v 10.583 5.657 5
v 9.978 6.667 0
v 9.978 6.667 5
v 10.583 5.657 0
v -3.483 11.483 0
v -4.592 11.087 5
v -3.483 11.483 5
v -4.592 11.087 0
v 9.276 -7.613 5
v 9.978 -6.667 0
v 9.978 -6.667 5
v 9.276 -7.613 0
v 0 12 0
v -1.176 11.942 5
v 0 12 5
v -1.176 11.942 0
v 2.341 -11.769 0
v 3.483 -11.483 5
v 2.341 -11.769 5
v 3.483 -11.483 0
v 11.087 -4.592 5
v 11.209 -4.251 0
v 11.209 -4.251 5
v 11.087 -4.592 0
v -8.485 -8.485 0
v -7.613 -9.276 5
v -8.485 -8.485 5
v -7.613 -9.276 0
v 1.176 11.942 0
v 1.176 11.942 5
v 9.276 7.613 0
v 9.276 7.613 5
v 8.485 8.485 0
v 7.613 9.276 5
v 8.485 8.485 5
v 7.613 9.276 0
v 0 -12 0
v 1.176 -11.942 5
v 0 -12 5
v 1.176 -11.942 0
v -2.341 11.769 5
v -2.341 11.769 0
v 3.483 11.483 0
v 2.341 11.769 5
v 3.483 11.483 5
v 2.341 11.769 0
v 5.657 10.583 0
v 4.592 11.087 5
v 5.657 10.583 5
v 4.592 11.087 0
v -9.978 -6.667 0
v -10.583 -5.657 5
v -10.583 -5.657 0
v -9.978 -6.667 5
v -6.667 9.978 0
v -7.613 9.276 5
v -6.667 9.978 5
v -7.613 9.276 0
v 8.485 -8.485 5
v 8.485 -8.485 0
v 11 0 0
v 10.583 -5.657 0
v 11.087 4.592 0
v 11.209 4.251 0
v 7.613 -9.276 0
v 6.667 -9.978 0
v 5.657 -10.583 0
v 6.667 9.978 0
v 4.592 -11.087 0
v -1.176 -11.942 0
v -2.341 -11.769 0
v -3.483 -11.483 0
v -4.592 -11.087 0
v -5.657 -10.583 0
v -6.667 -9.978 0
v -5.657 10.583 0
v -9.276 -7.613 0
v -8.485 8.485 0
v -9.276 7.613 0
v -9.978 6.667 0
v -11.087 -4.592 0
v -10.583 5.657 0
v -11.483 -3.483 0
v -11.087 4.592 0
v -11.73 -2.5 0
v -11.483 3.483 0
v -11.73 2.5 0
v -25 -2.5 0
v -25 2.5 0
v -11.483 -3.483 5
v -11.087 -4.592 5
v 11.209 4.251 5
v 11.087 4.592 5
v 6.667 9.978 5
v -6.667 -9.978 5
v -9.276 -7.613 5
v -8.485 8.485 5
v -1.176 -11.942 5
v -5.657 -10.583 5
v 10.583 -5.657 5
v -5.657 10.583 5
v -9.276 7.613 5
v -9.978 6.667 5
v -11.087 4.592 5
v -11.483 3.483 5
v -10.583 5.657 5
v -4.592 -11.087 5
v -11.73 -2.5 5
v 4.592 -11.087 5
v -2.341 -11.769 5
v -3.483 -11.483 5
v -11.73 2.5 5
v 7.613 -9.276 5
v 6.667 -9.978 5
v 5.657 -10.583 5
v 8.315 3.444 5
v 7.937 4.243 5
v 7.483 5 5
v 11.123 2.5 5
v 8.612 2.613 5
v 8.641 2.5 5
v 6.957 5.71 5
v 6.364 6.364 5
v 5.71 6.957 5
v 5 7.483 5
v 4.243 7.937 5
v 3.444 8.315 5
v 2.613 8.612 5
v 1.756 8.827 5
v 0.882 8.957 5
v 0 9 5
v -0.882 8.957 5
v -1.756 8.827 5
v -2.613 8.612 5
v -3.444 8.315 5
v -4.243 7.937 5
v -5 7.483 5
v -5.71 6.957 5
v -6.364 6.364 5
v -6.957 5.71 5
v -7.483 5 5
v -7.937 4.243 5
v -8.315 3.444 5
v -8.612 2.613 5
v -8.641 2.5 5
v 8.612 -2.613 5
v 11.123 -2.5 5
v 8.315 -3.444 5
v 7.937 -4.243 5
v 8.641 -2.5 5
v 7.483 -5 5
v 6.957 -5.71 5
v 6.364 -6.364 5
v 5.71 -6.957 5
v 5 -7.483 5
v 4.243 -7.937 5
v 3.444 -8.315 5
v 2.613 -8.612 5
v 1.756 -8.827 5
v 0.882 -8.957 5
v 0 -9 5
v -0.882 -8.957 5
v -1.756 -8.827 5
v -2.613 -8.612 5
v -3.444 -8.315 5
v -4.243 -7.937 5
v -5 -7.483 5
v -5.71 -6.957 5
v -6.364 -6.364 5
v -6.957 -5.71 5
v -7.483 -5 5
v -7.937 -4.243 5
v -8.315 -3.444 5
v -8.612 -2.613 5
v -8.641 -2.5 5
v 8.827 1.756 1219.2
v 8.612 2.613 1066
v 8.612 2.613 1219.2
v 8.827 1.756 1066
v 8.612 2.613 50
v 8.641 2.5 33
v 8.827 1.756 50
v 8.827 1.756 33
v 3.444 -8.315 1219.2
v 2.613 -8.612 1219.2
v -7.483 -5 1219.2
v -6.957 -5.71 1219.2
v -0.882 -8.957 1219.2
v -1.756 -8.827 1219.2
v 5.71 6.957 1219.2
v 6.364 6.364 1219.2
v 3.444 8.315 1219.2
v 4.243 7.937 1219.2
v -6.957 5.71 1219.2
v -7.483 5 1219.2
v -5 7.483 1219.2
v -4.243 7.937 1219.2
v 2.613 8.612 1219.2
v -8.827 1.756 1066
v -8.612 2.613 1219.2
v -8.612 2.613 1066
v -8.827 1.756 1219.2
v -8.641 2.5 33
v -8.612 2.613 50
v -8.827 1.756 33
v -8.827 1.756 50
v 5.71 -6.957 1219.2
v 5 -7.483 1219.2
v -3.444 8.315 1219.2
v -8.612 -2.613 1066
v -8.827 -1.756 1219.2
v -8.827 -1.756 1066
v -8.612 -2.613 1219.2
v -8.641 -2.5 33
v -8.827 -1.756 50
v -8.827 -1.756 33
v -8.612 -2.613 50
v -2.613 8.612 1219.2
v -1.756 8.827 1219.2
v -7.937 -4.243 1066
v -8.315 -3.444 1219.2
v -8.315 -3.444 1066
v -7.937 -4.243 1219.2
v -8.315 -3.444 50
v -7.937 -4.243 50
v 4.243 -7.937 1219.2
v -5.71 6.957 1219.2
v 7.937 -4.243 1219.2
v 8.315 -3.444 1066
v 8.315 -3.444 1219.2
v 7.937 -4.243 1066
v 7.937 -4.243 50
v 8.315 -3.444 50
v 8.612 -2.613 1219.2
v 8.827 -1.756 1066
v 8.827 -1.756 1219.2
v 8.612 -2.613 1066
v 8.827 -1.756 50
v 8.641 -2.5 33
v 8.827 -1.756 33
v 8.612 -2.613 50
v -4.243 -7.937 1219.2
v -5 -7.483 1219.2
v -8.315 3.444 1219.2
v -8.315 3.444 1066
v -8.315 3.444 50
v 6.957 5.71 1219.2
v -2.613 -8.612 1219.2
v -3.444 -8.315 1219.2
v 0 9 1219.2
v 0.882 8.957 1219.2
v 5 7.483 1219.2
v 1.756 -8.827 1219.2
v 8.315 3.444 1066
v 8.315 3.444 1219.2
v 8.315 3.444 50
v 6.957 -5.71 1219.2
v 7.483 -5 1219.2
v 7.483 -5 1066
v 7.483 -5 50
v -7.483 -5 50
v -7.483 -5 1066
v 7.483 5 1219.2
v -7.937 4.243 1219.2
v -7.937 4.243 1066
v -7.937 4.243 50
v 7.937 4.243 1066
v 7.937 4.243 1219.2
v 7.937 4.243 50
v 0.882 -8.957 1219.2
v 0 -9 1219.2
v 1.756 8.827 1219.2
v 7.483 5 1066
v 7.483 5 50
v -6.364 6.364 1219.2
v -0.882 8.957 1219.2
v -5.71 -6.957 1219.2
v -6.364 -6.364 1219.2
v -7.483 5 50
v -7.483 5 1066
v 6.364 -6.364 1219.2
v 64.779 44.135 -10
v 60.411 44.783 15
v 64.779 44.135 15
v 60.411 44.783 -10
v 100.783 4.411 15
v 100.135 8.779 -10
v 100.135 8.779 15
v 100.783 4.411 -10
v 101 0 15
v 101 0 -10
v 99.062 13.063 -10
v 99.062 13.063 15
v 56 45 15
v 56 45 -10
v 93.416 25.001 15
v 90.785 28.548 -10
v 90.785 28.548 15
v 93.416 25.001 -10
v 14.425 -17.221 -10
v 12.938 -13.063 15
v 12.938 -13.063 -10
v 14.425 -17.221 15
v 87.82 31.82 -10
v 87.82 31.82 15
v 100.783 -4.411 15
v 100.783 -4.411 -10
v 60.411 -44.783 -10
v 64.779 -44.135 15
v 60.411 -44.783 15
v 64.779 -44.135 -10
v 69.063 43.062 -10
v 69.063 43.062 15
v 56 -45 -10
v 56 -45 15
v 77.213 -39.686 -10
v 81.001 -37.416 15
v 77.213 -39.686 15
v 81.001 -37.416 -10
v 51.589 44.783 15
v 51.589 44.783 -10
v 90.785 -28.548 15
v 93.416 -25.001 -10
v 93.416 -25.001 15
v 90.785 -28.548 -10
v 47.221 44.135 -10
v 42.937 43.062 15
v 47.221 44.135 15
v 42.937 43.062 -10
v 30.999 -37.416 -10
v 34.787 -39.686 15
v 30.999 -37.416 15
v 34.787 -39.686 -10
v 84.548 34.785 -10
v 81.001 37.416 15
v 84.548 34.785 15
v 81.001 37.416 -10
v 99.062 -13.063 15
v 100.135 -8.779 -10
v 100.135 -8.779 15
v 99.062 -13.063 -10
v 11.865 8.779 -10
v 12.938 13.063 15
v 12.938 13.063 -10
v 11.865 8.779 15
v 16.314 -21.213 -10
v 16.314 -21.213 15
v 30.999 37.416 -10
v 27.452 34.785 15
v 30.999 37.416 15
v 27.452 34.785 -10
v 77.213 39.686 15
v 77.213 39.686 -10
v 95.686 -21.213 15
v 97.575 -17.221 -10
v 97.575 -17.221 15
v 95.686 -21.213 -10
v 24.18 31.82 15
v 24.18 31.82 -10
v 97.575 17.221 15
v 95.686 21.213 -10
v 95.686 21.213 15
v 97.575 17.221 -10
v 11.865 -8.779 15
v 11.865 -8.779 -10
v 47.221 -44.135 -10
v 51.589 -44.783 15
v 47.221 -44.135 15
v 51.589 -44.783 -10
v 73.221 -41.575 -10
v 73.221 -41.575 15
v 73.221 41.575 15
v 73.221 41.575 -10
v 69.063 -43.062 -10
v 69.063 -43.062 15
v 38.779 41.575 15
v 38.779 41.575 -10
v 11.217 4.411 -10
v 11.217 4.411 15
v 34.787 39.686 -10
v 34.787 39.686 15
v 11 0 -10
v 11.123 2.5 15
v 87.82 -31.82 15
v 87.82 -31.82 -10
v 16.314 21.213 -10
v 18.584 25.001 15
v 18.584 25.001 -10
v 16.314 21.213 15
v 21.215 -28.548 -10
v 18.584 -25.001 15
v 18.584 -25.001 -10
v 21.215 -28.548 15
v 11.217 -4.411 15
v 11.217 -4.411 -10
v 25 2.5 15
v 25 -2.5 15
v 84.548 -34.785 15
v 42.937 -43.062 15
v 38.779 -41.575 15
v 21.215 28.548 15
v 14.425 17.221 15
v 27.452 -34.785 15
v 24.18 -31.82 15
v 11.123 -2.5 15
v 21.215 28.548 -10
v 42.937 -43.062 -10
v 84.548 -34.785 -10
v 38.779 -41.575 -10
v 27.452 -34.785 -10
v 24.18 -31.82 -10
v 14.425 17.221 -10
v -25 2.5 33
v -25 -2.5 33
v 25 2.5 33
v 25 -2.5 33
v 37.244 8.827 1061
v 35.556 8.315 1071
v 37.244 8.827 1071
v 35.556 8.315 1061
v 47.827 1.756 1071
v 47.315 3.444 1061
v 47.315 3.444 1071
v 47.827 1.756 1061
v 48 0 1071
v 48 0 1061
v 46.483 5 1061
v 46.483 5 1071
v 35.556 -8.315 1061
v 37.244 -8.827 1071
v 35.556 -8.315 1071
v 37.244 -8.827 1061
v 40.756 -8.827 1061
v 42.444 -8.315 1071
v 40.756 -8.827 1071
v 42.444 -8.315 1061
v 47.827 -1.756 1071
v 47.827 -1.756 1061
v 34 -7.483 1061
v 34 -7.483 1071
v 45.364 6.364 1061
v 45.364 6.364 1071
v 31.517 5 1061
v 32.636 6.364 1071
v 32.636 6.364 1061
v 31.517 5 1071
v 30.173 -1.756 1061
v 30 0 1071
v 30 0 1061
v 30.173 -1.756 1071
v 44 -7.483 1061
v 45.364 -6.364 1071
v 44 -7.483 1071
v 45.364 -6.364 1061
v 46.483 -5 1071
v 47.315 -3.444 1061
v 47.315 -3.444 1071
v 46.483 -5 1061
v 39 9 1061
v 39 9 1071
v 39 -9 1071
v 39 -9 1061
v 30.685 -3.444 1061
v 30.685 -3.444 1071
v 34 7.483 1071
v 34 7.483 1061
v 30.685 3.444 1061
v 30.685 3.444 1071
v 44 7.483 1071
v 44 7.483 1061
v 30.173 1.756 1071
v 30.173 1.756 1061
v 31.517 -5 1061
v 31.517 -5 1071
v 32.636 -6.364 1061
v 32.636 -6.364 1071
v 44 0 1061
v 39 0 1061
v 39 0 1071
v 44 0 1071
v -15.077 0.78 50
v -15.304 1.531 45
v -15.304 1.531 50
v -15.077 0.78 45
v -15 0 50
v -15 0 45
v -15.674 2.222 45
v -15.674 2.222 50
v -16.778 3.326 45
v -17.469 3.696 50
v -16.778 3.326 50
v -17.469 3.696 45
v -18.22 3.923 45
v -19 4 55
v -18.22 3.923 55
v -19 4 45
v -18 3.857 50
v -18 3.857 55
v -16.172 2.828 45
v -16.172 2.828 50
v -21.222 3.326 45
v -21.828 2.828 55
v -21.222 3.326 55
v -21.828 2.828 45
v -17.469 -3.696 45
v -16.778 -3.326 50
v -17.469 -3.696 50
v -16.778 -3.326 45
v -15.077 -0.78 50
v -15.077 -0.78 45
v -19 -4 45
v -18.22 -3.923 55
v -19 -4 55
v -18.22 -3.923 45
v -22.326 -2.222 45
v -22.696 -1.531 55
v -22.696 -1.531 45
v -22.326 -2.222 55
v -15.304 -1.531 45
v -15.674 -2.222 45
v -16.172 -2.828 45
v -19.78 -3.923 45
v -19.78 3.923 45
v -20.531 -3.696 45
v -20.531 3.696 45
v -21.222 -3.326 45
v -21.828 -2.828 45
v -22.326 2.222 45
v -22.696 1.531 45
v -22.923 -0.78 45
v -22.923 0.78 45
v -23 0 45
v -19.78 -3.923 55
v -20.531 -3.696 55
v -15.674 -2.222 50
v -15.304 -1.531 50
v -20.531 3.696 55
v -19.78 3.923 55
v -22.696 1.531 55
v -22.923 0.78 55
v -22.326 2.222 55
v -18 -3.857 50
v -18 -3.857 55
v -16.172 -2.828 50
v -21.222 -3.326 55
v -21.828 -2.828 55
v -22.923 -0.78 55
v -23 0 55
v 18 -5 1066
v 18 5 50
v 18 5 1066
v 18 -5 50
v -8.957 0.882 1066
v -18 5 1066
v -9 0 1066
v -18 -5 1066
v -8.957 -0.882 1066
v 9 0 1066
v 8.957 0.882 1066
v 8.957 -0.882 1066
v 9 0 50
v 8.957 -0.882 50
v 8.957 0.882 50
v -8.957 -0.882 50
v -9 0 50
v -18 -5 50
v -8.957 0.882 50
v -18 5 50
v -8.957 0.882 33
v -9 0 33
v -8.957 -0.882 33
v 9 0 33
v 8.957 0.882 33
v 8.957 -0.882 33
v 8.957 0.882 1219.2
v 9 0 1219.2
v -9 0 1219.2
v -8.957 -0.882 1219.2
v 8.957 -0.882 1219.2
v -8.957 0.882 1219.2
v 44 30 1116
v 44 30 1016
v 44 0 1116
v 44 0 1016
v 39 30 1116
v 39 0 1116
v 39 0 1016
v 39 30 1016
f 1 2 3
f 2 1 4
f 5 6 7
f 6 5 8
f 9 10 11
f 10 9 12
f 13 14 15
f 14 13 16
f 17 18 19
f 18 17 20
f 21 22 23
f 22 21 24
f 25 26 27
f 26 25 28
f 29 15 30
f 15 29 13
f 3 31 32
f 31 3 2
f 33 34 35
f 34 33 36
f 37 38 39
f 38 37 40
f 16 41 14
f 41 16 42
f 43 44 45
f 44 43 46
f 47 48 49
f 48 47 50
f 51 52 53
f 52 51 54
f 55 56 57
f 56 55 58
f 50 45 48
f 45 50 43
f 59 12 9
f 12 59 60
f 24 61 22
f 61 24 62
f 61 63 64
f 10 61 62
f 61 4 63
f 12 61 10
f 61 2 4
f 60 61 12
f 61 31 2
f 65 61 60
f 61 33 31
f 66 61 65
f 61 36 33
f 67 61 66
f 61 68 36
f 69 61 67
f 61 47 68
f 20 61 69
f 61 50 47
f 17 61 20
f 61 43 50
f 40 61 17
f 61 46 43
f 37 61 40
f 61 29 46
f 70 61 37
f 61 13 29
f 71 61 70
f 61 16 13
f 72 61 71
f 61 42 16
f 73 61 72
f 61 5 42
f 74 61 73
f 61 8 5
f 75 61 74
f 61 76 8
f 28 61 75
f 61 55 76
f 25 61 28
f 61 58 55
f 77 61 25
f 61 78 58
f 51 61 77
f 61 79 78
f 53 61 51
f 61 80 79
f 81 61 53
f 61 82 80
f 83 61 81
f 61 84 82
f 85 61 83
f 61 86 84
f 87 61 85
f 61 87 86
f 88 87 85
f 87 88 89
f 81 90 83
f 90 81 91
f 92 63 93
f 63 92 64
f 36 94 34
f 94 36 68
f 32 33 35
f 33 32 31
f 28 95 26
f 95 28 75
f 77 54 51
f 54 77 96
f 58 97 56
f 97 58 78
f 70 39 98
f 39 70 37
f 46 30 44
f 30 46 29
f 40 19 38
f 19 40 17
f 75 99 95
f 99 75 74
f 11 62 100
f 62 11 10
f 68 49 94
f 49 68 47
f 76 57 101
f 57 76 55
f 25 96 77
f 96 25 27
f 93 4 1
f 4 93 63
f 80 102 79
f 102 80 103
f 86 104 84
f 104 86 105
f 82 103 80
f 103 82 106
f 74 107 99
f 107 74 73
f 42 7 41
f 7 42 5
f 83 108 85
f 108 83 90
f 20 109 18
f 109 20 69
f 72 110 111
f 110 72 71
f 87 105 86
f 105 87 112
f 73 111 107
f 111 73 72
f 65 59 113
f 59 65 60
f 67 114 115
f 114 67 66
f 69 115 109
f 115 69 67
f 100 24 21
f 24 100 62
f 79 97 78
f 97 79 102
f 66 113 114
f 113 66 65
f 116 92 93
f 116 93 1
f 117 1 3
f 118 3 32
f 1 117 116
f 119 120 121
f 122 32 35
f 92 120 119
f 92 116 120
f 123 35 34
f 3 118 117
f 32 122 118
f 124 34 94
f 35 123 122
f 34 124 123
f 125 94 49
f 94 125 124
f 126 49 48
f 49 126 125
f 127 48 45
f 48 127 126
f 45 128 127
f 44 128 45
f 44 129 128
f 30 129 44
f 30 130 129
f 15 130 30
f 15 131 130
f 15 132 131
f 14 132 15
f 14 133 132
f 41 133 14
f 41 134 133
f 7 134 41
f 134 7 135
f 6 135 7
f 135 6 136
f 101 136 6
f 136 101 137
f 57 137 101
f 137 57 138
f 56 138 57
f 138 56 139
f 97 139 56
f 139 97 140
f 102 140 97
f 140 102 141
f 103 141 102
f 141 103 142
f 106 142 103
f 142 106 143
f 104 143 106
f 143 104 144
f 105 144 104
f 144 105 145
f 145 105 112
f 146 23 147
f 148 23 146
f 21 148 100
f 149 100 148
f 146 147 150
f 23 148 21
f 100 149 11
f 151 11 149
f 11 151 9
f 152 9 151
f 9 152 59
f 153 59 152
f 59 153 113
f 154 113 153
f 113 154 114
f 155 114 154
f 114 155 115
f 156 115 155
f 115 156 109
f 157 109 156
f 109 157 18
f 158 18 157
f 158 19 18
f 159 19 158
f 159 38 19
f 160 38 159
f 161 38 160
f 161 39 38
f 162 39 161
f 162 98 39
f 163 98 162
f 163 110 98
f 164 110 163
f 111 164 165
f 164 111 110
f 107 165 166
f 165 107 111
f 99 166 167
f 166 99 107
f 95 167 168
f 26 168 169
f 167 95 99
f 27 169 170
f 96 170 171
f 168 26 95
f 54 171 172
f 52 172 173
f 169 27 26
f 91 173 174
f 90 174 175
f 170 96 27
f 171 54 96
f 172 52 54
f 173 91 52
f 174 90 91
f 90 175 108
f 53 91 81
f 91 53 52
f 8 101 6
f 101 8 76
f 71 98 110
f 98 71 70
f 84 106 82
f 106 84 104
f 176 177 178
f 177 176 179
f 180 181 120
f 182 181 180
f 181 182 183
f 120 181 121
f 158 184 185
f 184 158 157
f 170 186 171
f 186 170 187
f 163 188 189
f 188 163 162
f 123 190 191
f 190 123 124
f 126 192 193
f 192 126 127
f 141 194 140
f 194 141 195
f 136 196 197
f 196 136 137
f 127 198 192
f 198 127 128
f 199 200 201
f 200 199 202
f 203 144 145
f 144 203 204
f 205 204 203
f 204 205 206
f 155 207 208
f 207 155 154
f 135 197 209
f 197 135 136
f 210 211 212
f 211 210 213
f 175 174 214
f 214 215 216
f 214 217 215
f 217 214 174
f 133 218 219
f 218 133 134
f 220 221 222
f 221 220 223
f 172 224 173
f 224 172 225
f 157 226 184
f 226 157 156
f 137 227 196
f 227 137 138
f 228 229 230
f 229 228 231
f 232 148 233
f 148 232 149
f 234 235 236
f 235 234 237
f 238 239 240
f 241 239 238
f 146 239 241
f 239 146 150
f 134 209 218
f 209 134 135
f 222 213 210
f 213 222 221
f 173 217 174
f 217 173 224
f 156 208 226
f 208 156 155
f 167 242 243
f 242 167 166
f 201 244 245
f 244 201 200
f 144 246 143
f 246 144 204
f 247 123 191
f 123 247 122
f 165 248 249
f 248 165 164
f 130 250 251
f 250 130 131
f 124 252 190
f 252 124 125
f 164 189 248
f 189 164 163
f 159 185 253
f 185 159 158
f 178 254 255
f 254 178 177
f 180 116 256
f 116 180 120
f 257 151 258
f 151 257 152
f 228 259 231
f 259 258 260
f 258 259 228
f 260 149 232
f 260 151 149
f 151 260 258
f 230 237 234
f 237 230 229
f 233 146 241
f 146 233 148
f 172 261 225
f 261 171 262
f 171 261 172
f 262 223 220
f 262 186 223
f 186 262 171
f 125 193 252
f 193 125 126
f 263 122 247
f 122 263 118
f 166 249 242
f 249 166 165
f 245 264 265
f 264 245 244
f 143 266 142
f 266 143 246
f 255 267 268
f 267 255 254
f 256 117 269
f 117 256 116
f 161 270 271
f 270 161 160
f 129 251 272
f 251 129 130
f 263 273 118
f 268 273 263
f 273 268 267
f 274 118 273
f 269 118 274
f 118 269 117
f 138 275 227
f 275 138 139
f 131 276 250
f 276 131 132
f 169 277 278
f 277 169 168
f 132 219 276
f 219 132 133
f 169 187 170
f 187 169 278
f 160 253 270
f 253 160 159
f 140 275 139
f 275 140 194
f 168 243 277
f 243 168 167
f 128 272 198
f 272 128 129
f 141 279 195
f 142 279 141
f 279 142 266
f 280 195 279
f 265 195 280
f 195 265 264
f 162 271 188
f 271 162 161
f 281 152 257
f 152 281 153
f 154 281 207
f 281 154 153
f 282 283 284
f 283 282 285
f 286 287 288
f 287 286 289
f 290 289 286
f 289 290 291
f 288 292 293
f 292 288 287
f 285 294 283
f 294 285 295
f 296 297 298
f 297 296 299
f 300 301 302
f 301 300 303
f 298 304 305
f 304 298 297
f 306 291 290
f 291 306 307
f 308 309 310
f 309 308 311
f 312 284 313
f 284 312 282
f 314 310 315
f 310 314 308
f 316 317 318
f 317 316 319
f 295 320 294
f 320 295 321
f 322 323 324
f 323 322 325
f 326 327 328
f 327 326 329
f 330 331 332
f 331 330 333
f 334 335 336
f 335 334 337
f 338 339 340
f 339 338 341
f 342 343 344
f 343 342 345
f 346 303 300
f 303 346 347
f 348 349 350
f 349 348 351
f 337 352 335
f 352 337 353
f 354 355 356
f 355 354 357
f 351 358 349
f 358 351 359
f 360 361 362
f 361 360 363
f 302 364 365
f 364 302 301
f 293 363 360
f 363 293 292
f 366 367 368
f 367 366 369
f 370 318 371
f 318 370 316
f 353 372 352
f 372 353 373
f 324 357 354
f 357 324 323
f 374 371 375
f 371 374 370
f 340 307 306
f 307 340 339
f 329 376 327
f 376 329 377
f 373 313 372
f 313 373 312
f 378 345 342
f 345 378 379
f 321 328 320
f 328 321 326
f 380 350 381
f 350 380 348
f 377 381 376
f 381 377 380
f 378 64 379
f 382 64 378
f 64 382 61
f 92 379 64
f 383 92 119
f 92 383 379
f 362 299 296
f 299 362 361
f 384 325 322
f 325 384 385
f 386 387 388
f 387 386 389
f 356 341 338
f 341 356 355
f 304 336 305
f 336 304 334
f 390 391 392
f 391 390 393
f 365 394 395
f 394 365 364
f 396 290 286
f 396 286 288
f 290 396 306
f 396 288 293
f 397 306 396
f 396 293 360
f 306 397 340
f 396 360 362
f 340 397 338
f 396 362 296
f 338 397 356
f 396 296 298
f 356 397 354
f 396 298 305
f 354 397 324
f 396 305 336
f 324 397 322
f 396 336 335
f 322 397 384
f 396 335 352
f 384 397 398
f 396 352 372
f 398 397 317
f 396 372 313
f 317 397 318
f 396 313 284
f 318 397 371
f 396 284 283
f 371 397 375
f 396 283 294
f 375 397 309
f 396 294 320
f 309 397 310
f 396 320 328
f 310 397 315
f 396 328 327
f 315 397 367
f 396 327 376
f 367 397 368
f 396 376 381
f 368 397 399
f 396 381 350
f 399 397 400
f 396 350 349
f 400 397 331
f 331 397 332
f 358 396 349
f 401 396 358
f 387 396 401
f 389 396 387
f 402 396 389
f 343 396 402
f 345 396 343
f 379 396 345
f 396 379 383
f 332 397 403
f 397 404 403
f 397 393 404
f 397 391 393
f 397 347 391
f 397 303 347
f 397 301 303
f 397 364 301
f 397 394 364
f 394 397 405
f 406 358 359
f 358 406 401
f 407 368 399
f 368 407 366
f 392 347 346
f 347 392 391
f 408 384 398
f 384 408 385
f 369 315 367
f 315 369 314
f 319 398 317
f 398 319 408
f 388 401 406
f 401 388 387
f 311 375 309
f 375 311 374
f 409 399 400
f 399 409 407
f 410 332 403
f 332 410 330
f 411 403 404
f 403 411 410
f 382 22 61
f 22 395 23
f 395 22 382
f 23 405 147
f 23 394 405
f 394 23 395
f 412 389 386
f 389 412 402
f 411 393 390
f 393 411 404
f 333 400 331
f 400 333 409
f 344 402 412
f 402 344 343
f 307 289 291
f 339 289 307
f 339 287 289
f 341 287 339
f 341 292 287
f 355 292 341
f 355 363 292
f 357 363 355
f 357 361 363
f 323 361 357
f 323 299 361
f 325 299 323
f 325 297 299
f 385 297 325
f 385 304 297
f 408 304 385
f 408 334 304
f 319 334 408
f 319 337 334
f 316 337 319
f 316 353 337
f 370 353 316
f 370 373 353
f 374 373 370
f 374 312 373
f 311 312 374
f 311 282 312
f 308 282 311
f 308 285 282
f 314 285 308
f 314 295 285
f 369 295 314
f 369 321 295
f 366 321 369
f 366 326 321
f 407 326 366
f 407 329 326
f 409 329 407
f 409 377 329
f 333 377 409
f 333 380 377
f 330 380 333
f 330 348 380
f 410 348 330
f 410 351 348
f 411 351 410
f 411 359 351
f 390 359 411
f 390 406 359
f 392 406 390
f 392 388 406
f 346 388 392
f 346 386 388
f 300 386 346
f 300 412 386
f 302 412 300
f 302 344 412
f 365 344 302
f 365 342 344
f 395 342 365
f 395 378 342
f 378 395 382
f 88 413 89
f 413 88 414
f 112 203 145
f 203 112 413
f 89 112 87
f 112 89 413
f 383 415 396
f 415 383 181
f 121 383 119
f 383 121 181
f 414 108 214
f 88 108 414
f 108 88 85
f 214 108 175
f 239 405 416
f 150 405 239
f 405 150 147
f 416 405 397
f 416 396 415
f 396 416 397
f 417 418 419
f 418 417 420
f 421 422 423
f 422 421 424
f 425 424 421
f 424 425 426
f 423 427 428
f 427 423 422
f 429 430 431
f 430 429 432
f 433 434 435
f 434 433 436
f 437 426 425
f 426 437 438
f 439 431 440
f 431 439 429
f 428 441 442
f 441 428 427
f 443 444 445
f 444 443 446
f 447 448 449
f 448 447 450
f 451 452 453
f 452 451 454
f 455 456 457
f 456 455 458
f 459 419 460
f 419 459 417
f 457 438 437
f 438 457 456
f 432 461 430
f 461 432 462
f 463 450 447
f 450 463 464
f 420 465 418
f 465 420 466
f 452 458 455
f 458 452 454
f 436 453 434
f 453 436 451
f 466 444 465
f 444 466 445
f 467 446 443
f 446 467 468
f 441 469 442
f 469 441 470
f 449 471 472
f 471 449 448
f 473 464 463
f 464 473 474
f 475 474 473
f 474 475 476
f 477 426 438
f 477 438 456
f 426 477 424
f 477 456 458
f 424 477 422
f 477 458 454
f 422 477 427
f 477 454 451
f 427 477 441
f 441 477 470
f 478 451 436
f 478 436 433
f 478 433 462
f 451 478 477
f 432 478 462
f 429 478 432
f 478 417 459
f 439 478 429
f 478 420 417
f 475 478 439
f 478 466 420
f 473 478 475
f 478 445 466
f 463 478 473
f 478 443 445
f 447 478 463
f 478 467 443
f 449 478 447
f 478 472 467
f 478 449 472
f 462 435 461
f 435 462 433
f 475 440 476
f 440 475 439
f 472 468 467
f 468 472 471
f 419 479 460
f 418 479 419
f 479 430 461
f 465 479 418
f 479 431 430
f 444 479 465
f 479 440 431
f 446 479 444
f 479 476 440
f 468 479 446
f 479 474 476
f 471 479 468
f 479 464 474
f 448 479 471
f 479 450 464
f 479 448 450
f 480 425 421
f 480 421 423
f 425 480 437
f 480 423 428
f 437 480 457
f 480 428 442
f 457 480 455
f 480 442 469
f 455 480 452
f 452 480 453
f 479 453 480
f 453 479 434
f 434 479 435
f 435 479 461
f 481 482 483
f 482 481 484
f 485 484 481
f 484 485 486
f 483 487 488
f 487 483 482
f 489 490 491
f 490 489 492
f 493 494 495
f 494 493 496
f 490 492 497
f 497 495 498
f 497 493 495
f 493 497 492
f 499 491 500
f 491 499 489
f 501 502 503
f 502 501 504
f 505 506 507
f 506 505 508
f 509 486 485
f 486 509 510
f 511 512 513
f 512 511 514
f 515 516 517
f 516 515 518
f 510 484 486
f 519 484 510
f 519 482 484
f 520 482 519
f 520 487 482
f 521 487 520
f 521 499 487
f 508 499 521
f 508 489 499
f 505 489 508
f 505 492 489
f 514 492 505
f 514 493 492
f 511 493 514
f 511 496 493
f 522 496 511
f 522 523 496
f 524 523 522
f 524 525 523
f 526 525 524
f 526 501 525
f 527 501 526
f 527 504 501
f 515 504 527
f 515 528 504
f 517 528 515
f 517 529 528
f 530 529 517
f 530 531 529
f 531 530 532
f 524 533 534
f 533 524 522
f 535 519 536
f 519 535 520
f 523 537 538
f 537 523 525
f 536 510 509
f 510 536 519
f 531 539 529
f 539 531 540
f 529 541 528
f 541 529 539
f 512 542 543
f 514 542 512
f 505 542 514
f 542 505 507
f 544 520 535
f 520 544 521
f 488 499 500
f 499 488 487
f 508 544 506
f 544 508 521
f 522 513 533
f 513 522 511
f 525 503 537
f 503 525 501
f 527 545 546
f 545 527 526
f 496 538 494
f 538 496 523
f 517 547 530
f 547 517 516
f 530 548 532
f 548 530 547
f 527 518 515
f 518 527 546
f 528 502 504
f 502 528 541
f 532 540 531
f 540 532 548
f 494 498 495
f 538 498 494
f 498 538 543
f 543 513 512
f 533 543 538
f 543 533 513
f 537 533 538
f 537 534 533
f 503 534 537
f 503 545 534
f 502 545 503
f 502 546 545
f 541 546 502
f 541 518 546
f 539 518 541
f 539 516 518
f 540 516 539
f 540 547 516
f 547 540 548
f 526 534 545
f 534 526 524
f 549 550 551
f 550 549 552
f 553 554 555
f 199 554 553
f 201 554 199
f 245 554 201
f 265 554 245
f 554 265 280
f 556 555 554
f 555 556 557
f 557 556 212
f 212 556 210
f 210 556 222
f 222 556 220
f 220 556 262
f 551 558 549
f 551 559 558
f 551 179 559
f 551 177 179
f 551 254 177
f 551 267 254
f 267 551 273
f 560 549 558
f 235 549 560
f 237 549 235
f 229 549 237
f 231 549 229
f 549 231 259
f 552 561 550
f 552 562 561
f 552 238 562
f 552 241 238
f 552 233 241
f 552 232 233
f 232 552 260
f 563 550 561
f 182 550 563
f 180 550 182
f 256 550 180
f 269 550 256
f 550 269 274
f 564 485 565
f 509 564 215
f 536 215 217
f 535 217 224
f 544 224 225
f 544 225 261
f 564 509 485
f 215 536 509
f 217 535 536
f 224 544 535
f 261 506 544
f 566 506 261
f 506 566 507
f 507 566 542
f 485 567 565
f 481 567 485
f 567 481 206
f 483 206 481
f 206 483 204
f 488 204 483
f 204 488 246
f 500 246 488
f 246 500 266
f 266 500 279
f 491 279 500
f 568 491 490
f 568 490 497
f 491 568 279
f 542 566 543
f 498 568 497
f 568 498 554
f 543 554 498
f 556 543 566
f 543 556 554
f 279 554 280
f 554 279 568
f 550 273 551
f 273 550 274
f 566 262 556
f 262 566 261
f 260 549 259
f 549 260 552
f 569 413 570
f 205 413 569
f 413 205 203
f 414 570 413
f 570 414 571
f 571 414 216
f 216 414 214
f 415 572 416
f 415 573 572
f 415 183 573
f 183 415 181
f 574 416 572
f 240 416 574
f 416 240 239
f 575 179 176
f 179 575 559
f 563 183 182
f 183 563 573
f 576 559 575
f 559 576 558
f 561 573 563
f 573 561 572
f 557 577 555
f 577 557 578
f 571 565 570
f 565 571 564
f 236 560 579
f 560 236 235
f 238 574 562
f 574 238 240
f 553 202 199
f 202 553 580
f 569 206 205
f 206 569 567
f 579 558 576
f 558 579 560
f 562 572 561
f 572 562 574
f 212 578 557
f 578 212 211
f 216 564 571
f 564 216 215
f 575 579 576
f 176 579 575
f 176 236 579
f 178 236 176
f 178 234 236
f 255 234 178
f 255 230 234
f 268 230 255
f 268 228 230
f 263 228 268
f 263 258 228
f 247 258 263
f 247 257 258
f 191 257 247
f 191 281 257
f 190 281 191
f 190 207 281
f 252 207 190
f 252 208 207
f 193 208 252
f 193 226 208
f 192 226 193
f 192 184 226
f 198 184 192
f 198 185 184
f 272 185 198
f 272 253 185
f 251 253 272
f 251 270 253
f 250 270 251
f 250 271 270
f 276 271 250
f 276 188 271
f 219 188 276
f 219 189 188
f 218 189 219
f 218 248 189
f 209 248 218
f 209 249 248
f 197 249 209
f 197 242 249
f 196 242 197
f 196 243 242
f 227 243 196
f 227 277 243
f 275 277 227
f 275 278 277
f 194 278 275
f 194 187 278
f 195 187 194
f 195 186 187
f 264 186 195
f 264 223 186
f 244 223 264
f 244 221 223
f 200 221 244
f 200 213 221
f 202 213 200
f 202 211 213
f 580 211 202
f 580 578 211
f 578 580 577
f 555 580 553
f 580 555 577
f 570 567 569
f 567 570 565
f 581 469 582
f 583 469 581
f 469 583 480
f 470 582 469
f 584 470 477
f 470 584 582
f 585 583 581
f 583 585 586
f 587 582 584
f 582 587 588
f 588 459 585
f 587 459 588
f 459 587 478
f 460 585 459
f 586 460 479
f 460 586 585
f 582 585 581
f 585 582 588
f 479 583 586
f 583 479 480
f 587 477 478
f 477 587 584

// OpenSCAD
//
// WeedGripperTool v0.1
// Single-file parametric OpenSCAD example for a weed-pulling tool.
// By [Your Name or Organization], [Date]
//
// NOTES:
//  - This script is a conceptual starting point with placeholder geometry.
//  - You should refine geometry for strength, print orientation, CNC details, etc.
//  - Modules are designed to be easily re-used or rearranged as you iterate.
//
// LICENSE: Whatever license you prefer (e.g., MIT, CC-BY, GPL, etc.)
//

//----------------------------------------
// Top-Level Parameters & Constants
//----------------------------------------

// Unit conversion for convenience
function inToMM(inches) = inches * 25.4; 

// 1/2" EMT approximate dimensions
emtOD = 18;          // Outer diameter in mm (nominal ~17.9mm)
emtID = 16;          // Inner diameter in mm (nominal ~15.8mm)

// Overall tool length (EMT conduit)
toolLength = inToMM(48);  // 48" ~ 1219mm

// Handle/Lever geometry
handleHeightFromBottom = inToMM(40);  // Lever/trigger ~40" from bottom
handleOffset = 30;                   // How far handle protrudes from pipe
handleThickness = 5;                 // For extrusions, placeholders

// Jaw/gripper geometry
jawMaxSpan = 50;     // ~2" in mm, max open span of jaws
jawDepth = 30;       // Some arbitrary depth for 3D printed jaws
jawThickness = 5;    // Basic thickness for each jaw half

// Wheel / pivot geometry
useWheels = true;
wheelDiameter = 90;   // e.g., a reused 3D filament spool or small wheel
wheelThickness = 25;  // approximate thickness for spool-type wheel
wheelMountThickness = 5;

// Belt/Pulley placeholders
beltWidth = 10;   // GT2 belt 10 mm wide
pulleyOD = 18;    // Example GT2 pulley OD, placeholders
idlerOD = 8;      // Example GT2 idler OD, placeholders

// Screw & hardware parameters
boltHoleDiameter = 5.5;    // For M5 bolts
nutTrapDepth = 6;          // Param for nylock or standard nut captures
plateThicknessAcrylic = 6; // e.g., 1/4" ~ 6.35mm for acrylic
plateThicknessPlywood = 12; // e.g., 1/2" ~ 12.7mm for plywood

// Pro version includes optional AI hardware mount
ProVersion = false;  // If true, adds Pi Camera, servo/stepper placeholders, etc.

// Debug / assembly
showExploded = false; 
explodeOffset = 50;  // How far to shift components for clarity

//----------------------------------------
// Modules
//----------------------------------------

//
// 1) EMT Conduit Placeholder
//
// This is just a visual placeholder for the tube you’ll supply
// Users will purchase their own 1/2" EMT conduit (48" long).
//
module showEMT() {
    color("silver") 
    cylinder(h=toolLength, r=emtOD/2, center=false, $fn=64);
}

//
// 2) EMT Mount (for wheel pivot, for handle, etc.)
// Param: height -> the position along the EMT to mount
//        thickness -> extrude thickness
//        name -> string for identification
//
module emtMount(height, thickness=5, name="emtMount") {
    // Basic ring clamp that attaches around the EMT
    translate([0,0,height])
    difference() {
        cylinder(h=thickness, r=emtOD/2+3, center=false, $fn=64); // Outer
        cylinder(h=thickness+0.1, r=emtOD/2, center=false, $fn=64); // Subtract ID
    }
}

//
// 3) Lever/Trigger Handle
// Very rough "rifle style" handle shape for demonstration
// You can refine the shape to be more comfortable and aesthetic.
//
module handle() {
    // A simplistic handle: a vertical rectangular extrusion offset from the pipe.
    translate([emtOD/2 + handleOffset,0,handleHeightFromBottom]) {
        color("red")
        cube([handleThickness, 30, 100], center=false);
    }
}

//
// 4) Gripper Jaws
// Two opposing jaws that pinch around a center axis. 
// We'll do a simplistic shape here. Each jaw is a box with a curved tip. 
// You can adapt more specialized geometry (fingerlike shape, etc.).
//
module gripperJaws() {
    // "Left" jaw
    translate([-jawMaxSpan/2,0,0]) {
        color("green")
        union() {
            // Main block
            cube([jawMaxSpan/2, jawThickness, jawDepth], center=false);
            // Curved tip for comedic "finger" shape
            translate([jawMaxSpan/2, jawThickness/2, jawDepth/2]) {
                cylinder(h=jawThickness, r=jawThickness, $fn=32, center=true);
            }
        }
    }
    // "Right" jaw
    translate([0,0,0]) {
        color("green")
        union() {
            cube([jawMaxSpan/2, jawThickness, jawDepth], center=false);
            translate([0, jawThickness/2, jawDepth/2]) {
                cylinder(h=jawThickness, r=jawThickness, $fn=32, center=true);
            }
        }
    }
}

//
// 5) TPU Finger Pads
// Example insert that fits over the jaws or has a friction fit
// In real design, you'd ensure geometry for tension, alignment, etc.
//
module tpuFingerPad() {
    color("yellow")
    // Just a small piece that can be glued or friction-fit on top of each jaw tip.
    // We'll define a single pad; you'd instance it in place for each jaw if needed.
    translate([0,0,jawDepth]) {
        cube([jawMaxSpan/2, jawThickness, 3], center=false);
    }
}

//
// 6) Pivot/Wheel Module
// This could be a 3D-printed or CNC cut bracket that mounts a wheel or spool
// near the bottom of the tool so it can roll/pivot, making it easier to lever weeds.
// 
module pivotWheelMount() {
    // We'll place the wheel near the bottom, with the bracket around the EMT
    // For demonstration, we create a ring clamp plus an axle for the wheel
    color("blue")
    union() {
        // The clamp around the EMT
        emtMount(0, wheelMountThickness, "wheelClamp");

        // Axle for wheel
        translate([emtOD/2 + wheelDiameter/2 + 2, 0, wheelMountThickness/2]) {
            cylinder(h=10, r=3, center=true, $fn=32);
        }
    }
}

//
// 7) Wheel/Omni-wheel or spool
// The actual rolling element. Could be an omni-wheel or spool from 3D filament.
//
module pivotWheel() {
    color("orange")
    translate([emtOD/2 + wheelDiameter/2 + 2, 0, wheelMountThickness/2]) {
        cylinder(h=wheelThickness, r=wheelDiameter/2, center=true, $fn=64);
    }
}

//
// 8) Belt/Pulley/Idler placeholders
// The actual path and tension mechanism is up to you—this is just a demonstration.
//
module beltSystem() {
    color("purple")
    // Show a pulley near handle
    translate([emtOD/2 + handleOffset, 0, handleHeightFromBottom + 50]) {
        cylinder(h=beltWidth, r=pulleyOD/2, center=true, $fn=32);
    }
    
    // Show an idler near jaws (you'd refine exact positioning)
    translate([-(emtOD/2 + 10), 0, 50]) {
        cylinder(h=beltWidth, r=idlerOD/2, center=true, $fn=32);
    }
    
    // Just a placeholder belt as a rectangular block
    // In real design, you'd extrude a path or show a more accurate belt shape.
    translate([-emtOD, -beltWidth/2, 50]) 
    cube([emtOD*2, beltWidth, handleHeightFromBottom], center=false);
}

//
// 9) ProVersion Electronics
// If ProVersion is true, we add mounts for a Pi Zero, camera, servo/stepper, etc.
//
module proElectronicsMount() {
    if (ProVersion) {
        color("cyan")
        translate([emtOD/2 + handleOffset + 50, 0, handleHeightFromBottom]) {
            // Pi Zero 2W placeholder: ~65mm x 30mm board
            cube([65,30,5], center=false);
        }
        // Camera mount, servo/stepper placeholders, etc. 
        translate([emtOD/2 + handleOffset + 60, 0, handleHeightFromBottom + 60]) {
            cube([30,30,30], center=false);
        }
    }
}

//
// 10) Complete Bottom Gripper Assembly
// For clarity, we combine jaws, finger pads, belt system, etc. 
// and position them at the bottom of the EMT.
//
module bottomAssembly() {
    // We'll place everything near the bottom. 
    // In reality, you'd want a pivot or scissor mechanism to open/close jaws.
    
    // Jaws
    translate([0, -jawThickness/2, 0]) rotate([0,0,0]) {
        gripperJaws();
    }
    // Finger pads on each jaw
    // Left jaw pad
    translate([-jawMaxSpan/2, -jawThickness/2, 0]) {
        tpuFingerPad();
    }
    // Right jaw pad
    translate([0, -jawThickness/2, 0]) {
        tpuFingerPad();
    }
    
    // Example belt system that might connect up the conduit
    beltSystem();
}

//
// 11) Main Assembly
//
module mainAssembly() {
    
    // Show EMT Tube
    showEMT();
    
    // Wheel pivot near bottom
    if (useWheels) {
        pivotWheelMount();
        pivotWheel();
    }
    
    // The handle/trigger near the top
    handle();
    
    // The bottom clamp/gripper system
    bottomAssembly();
    
    // Optional Pro electronics
    proElectronicsMount();
}

//
// 12) Exploded view
// If showExploded is true, separate each sub-assembly for demonstration
//
module explodedAssembly() {
    if (showExploded) {
        // We shift each sub component in X or Y for demonstration
        translate([0,0,0]) showEMT();
        translate([explodeOffset,0,0]) pivotWheelMount();
        translate([explodeOffset*2,0,0]) pivotWheel();
        translate([0,explodeOffset,0]) handle();
        translate([explodeOffset,explodeOffset,0]) bottomAssembly();
        translate([explodeOffset*2,explodeOffset,0]) proElectronicsMount();
    } else {
        mainAssembly();
    }
}

//----------------------------------------
// Final call: render the entire design
//----------------------------------------
explodedAssembly();
